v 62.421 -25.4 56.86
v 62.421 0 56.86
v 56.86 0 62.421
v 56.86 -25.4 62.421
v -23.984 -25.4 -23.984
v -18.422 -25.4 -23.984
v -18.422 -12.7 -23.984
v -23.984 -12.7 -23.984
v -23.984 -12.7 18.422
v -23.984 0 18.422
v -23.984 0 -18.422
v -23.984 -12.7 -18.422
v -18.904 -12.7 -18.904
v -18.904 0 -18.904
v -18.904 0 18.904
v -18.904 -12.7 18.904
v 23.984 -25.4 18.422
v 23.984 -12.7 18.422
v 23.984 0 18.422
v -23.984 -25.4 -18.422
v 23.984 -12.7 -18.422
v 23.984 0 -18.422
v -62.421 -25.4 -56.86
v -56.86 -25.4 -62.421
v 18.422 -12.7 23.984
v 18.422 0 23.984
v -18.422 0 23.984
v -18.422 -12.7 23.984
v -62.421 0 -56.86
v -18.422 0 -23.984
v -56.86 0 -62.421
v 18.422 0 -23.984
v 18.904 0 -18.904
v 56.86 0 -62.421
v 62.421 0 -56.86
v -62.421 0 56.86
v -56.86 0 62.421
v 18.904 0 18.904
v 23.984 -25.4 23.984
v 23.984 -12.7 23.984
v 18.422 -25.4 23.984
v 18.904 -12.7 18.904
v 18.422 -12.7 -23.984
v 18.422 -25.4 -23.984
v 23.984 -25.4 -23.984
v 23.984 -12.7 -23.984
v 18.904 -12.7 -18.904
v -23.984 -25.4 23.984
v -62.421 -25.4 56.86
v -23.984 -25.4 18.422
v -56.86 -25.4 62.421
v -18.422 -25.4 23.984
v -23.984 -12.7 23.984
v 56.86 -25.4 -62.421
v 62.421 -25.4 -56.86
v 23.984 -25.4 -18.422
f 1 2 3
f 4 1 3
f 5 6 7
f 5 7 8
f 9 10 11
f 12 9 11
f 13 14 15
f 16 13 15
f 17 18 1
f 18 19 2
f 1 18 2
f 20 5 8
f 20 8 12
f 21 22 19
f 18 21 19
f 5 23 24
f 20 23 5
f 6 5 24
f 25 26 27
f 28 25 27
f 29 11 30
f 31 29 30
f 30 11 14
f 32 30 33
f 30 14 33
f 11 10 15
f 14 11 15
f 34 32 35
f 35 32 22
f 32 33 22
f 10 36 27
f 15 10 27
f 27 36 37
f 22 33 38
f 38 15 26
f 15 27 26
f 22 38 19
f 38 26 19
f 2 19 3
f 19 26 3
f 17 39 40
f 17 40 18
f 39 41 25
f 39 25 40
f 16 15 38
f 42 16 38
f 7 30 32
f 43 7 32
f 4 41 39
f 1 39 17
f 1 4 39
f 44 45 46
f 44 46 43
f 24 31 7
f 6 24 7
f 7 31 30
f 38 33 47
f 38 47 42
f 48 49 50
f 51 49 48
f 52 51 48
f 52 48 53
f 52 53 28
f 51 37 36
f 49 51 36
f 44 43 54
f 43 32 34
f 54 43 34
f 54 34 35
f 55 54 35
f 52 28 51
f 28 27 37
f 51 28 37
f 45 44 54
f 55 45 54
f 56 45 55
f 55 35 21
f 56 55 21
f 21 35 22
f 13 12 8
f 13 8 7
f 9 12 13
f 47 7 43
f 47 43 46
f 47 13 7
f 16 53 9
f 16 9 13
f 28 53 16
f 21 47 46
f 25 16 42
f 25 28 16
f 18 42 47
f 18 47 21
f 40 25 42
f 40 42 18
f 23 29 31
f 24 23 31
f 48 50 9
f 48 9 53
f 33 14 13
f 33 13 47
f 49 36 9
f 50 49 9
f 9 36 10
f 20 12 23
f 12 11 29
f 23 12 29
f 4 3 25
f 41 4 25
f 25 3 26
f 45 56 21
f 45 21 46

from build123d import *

# Parameters (mm, degrees)
F0_W     = 37.8080839926
F0_H     = 37.8080839926
F1_DEPTH = 12.7
F4_DEPTH = 25.4


# Not quite as in the source:
# - the program builds the solid bodies; features that only make, move or delete a surface that nothing else refers to are left out


with BuildPart() as f1:
    # F0 (on Front) → F1 (new body)
    with BuildSketch(Plane.XZ):
        Polygon((23.9840419963, 18.4223433702), (23.9840419963, 23.9840419963), (18.4223433702, 23.9840419963), (-18.4223433702, 23.9840419963), (-23.9840419963, 23.9840419963), (-23.9840419963, 18.4223433702), (-23.9840419963, -18.4223433702), (-23.9840419963, -23.9840419963), (-18.4223433702, -23.9840419963), (18.4223433702, -23.9840419963), (23.9840419963, -23.9840419963), (23.9840419963, -18.4223433702), align=None)
        Rectangle(F0_W, F0_H, mode=Mode.SUBTRACT)
    extrude(amount=F1_DEPTH)

    # F0 (on Front) → F4 (join)
    with BuildSketch(Plane.XZ):
        with BuildLine():
            Line((-23.9840419963, 23.9840419963), (-18.4223433702, 23.9840419963))
            Line((-18.4223433702, 23.9840419963), (-44.0913446559, 49.653043282))
            ThreePointArc((-44.0913446559, 49.653043282), (-46.5728804881, 46.5728804881), (-49.653043282, 44.0913446559))
            Line((-49.653043282, 44.0913446559), (-23.9840419963, 18.4223433702))
            Line((-23.9840419963, 18.4223433702), (-23.9840419963, 23.9840419963))
        make_face()
        with BuildLine():
            ThreePointArc((-49.653043282, 44.0913446559), (-46.5728804881, 46.5728804881), (-44.0913446559, 49.653043282))
            Line((-44.0913446559, 49.653043282), (-56.85978783, 62.4214864561))
            Line((-56.85978783, 62.4214864561), (-62.4214864561, 56.85978783))
            Line((-62.4214864561, 56.85978783), (-49.653043282, 44.0913446559))
        make_face()
        with BuildLine():
            ThreePointArc((-44.0913446559, -49.653043282), (-46.5728804881, -46.5728804881), (-49.653043282, -44.0913446559))
            Line((-49.653043282, -44.0913446559), (-62.4214864561, -56.85978783))
            Line((-62.4214864561, -56.85978783), (-56.85978783, -62.4214864561))
            Line((-56.85978783, -62.4214864561), (-44.0913446559, -49.653043282))
        make_face()
        with BuildLine():
            Line((-23.9840419963, -23.9840419963), (-23.9840419963, -18.4223433702))
            Line((-23.9840419963, -18.4223433702), (-49.653043282, -44.0913446559))
            ThreePointArc((-49.653043282, -44.0913446559), (-46.5728804881, -46.5728804881), (-44.0913446559, -49.653043282))
            Line((-44.0913446559, -49.653043282), (-18.4223433702, -23.9840419963))
            Line((-18.4223433702, -23.9840419963), (-23.9840419963, -23.9840419963))
        make_face()
        with BuildLine():
            Line((49.653043282, -44.0913446559), (23.9840419963, -18.4223433702))
            Line((23.9840419963, -18.4223433702), (23.9840419963, -23.9840419963))
            Line((23.9840419963, -23.9840419963), (18.4223433702, -23.9840419963))
            Line((18.4223433702, -23.9840419963), (44.0913446559, -49.653043282))
            ThreePointArc((44.0913446559, -49.653043282), (46.5728804881, -46.5728804881), (49.653043282, -44.0913446559))
        make_face()
        with BuildLine():
            Line((62.4214864561, -56.85978783), (49.653043282, -44.0913446559))
            ThreePointArc((49.653043282, -44.0913446559), (46.5728804881, -46.5728804881), (44.0913446559, -49.653043282))
            Line((44.0913446559, -49.653043282), (56.85978783, -62.4214864561))
            Line((56.85978783, -62.4214864561), (62.4214864561, -56.85978783))
        make_face()
        with BuildLine():
            Line((56.85978783, 62.4214864561), (44.0913446559, 49.653043282))
            ThreePointArc((44.0913446559, 49.653043282), (46.5728804881, 46.5728804881), (49.653043282, 44.0913446559))
            Line((49.653043282, 44.0913446559), (62.4214864561, 56.85978783))
            Line((62.4214864561, 56.85978783), (56.85978783, 62.4214864561))
        make_face()
        with BuildLine():
            Line((18.4223433702, 23.9840419963), (23.9840419963, 23.9840419963))
            Line((23.9840419963, 23.9840419963), (23.9840419963, 18.4223433702))
            Line((23.9840419963, 18.4223433702), (49.653043282, 44.0913446559))
            ThreePointArc((49.653043282, 44.0913446559), (46.5728804881, 46.5728804881), (44.0913446559, 49.653043282))
            Line((44.0913446559, 49.653043282), (18.4223433702, 23.9840419963))
        make_face()
    extrude(amount=F4_DEPTH)


solid = f1.part
